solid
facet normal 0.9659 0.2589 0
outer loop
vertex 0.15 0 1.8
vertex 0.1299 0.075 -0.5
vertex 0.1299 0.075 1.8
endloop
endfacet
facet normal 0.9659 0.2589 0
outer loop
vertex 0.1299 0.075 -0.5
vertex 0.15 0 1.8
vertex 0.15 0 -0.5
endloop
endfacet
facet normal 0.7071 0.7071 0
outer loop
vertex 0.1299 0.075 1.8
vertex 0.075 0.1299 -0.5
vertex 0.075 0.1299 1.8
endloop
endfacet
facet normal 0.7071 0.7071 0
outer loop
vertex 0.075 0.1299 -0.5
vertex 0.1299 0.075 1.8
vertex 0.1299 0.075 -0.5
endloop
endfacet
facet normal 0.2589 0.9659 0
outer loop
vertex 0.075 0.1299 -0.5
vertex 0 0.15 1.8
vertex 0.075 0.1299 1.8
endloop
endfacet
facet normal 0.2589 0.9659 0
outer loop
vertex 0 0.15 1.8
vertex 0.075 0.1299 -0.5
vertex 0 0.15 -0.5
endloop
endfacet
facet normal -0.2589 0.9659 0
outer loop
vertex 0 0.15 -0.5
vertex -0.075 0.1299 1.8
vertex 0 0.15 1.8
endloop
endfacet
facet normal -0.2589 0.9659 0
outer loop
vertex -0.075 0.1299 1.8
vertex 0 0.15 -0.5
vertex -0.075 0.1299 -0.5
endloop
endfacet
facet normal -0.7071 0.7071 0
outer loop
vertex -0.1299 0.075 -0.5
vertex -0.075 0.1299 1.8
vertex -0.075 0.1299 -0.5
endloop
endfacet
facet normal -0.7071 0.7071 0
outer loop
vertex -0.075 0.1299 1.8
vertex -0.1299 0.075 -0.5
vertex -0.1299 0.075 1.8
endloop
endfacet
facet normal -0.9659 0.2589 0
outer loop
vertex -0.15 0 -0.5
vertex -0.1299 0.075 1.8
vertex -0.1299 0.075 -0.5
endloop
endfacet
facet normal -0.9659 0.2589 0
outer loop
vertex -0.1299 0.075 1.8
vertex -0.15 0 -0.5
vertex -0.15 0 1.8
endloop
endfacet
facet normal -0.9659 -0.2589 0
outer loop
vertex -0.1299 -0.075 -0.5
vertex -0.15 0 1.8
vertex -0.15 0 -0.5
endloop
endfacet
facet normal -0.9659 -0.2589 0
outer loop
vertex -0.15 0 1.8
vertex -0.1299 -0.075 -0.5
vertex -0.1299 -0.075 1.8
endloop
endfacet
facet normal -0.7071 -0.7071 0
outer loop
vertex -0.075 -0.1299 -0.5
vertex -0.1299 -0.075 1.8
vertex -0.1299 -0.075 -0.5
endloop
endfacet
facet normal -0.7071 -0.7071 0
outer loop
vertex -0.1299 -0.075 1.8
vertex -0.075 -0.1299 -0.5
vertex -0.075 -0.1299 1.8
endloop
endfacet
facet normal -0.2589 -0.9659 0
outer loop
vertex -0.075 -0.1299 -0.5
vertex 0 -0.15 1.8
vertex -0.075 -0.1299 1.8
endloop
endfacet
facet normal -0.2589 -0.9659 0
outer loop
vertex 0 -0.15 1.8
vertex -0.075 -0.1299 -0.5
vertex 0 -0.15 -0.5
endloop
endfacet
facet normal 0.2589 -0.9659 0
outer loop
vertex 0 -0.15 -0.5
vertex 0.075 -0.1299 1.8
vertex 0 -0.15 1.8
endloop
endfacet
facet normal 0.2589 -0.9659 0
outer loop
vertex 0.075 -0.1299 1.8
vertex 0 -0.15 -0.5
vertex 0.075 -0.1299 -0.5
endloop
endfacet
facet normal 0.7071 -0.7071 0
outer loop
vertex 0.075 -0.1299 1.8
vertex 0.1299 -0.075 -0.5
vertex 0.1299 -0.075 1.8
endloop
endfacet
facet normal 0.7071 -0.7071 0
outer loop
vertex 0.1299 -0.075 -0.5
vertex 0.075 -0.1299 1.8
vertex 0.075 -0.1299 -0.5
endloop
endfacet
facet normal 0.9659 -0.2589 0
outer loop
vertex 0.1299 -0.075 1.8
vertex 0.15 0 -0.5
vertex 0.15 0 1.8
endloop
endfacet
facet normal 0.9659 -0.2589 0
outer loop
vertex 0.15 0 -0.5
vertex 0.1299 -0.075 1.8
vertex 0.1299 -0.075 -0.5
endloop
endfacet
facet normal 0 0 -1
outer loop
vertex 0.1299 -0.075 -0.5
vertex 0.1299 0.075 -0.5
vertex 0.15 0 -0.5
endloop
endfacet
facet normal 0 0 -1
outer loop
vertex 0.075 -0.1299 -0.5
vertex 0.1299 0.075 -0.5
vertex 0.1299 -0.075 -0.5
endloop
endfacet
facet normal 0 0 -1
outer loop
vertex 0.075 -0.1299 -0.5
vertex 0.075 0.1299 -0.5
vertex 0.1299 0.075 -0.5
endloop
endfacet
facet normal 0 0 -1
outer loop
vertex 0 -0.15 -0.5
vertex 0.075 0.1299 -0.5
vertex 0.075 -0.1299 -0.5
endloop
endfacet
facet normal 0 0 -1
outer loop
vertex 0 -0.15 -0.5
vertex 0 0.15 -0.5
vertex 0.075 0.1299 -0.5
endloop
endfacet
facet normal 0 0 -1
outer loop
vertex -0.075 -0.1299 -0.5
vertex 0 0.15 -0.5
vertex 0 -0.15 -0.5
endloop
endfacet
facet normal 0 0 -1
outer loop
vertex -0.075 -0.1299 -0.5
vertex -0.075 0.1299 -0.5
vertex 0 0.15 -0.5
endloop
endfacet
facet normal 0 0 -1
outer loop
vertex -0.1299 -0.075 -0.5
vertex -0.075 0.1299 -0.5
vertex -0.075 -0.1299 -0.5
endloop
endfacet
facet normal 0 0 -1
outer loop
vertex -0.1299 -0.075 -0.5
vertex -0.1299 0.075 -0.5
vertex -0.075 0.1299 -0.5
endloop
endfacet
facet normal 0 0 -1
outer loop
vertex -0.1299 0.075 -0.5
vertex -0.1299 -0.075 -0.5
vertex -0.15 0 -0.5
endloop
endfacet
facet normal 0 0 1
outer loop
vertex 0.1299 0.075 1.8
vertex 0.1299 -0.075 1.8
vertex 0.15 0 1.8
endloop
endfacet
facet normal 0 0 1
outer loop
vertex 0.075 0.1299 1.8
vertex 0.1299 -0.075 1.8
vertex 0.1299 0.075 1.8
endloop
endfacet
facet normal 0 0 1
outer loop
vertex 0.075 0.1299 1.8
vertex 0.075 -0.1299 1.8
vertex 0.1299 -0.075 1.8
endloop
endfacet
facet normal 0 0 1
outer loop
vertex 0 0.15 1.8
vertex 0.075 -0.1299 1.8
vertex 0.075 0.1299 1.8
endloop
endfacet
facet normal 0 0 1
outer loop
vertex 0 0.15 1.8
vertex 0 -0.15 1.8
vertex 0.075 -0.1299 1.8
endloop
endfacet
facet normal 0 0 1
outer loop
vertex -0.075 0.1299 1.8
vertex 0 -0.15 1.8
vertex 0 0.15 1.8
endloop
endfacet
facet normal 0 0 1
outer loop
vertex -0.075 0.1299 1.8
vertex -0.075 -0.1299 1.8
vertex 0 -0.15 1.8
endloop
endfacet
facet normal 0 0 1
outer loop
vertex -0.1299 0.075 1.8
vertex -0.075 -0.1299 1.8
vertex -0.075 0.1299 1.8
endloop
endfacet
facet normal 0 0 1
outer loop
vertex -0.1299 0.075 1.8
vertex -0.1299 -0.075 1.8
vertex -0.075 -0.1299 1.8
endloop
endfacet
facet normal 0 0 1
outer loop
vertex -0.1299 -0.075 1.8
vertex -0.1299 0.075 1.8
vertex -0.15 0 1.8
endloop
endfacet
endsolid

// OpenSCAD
// Shed shell kit: chimney. See lib/lodge_kit.scad.
include <lib/lodge_kit.scad>
kind = "shed";
chimney();
